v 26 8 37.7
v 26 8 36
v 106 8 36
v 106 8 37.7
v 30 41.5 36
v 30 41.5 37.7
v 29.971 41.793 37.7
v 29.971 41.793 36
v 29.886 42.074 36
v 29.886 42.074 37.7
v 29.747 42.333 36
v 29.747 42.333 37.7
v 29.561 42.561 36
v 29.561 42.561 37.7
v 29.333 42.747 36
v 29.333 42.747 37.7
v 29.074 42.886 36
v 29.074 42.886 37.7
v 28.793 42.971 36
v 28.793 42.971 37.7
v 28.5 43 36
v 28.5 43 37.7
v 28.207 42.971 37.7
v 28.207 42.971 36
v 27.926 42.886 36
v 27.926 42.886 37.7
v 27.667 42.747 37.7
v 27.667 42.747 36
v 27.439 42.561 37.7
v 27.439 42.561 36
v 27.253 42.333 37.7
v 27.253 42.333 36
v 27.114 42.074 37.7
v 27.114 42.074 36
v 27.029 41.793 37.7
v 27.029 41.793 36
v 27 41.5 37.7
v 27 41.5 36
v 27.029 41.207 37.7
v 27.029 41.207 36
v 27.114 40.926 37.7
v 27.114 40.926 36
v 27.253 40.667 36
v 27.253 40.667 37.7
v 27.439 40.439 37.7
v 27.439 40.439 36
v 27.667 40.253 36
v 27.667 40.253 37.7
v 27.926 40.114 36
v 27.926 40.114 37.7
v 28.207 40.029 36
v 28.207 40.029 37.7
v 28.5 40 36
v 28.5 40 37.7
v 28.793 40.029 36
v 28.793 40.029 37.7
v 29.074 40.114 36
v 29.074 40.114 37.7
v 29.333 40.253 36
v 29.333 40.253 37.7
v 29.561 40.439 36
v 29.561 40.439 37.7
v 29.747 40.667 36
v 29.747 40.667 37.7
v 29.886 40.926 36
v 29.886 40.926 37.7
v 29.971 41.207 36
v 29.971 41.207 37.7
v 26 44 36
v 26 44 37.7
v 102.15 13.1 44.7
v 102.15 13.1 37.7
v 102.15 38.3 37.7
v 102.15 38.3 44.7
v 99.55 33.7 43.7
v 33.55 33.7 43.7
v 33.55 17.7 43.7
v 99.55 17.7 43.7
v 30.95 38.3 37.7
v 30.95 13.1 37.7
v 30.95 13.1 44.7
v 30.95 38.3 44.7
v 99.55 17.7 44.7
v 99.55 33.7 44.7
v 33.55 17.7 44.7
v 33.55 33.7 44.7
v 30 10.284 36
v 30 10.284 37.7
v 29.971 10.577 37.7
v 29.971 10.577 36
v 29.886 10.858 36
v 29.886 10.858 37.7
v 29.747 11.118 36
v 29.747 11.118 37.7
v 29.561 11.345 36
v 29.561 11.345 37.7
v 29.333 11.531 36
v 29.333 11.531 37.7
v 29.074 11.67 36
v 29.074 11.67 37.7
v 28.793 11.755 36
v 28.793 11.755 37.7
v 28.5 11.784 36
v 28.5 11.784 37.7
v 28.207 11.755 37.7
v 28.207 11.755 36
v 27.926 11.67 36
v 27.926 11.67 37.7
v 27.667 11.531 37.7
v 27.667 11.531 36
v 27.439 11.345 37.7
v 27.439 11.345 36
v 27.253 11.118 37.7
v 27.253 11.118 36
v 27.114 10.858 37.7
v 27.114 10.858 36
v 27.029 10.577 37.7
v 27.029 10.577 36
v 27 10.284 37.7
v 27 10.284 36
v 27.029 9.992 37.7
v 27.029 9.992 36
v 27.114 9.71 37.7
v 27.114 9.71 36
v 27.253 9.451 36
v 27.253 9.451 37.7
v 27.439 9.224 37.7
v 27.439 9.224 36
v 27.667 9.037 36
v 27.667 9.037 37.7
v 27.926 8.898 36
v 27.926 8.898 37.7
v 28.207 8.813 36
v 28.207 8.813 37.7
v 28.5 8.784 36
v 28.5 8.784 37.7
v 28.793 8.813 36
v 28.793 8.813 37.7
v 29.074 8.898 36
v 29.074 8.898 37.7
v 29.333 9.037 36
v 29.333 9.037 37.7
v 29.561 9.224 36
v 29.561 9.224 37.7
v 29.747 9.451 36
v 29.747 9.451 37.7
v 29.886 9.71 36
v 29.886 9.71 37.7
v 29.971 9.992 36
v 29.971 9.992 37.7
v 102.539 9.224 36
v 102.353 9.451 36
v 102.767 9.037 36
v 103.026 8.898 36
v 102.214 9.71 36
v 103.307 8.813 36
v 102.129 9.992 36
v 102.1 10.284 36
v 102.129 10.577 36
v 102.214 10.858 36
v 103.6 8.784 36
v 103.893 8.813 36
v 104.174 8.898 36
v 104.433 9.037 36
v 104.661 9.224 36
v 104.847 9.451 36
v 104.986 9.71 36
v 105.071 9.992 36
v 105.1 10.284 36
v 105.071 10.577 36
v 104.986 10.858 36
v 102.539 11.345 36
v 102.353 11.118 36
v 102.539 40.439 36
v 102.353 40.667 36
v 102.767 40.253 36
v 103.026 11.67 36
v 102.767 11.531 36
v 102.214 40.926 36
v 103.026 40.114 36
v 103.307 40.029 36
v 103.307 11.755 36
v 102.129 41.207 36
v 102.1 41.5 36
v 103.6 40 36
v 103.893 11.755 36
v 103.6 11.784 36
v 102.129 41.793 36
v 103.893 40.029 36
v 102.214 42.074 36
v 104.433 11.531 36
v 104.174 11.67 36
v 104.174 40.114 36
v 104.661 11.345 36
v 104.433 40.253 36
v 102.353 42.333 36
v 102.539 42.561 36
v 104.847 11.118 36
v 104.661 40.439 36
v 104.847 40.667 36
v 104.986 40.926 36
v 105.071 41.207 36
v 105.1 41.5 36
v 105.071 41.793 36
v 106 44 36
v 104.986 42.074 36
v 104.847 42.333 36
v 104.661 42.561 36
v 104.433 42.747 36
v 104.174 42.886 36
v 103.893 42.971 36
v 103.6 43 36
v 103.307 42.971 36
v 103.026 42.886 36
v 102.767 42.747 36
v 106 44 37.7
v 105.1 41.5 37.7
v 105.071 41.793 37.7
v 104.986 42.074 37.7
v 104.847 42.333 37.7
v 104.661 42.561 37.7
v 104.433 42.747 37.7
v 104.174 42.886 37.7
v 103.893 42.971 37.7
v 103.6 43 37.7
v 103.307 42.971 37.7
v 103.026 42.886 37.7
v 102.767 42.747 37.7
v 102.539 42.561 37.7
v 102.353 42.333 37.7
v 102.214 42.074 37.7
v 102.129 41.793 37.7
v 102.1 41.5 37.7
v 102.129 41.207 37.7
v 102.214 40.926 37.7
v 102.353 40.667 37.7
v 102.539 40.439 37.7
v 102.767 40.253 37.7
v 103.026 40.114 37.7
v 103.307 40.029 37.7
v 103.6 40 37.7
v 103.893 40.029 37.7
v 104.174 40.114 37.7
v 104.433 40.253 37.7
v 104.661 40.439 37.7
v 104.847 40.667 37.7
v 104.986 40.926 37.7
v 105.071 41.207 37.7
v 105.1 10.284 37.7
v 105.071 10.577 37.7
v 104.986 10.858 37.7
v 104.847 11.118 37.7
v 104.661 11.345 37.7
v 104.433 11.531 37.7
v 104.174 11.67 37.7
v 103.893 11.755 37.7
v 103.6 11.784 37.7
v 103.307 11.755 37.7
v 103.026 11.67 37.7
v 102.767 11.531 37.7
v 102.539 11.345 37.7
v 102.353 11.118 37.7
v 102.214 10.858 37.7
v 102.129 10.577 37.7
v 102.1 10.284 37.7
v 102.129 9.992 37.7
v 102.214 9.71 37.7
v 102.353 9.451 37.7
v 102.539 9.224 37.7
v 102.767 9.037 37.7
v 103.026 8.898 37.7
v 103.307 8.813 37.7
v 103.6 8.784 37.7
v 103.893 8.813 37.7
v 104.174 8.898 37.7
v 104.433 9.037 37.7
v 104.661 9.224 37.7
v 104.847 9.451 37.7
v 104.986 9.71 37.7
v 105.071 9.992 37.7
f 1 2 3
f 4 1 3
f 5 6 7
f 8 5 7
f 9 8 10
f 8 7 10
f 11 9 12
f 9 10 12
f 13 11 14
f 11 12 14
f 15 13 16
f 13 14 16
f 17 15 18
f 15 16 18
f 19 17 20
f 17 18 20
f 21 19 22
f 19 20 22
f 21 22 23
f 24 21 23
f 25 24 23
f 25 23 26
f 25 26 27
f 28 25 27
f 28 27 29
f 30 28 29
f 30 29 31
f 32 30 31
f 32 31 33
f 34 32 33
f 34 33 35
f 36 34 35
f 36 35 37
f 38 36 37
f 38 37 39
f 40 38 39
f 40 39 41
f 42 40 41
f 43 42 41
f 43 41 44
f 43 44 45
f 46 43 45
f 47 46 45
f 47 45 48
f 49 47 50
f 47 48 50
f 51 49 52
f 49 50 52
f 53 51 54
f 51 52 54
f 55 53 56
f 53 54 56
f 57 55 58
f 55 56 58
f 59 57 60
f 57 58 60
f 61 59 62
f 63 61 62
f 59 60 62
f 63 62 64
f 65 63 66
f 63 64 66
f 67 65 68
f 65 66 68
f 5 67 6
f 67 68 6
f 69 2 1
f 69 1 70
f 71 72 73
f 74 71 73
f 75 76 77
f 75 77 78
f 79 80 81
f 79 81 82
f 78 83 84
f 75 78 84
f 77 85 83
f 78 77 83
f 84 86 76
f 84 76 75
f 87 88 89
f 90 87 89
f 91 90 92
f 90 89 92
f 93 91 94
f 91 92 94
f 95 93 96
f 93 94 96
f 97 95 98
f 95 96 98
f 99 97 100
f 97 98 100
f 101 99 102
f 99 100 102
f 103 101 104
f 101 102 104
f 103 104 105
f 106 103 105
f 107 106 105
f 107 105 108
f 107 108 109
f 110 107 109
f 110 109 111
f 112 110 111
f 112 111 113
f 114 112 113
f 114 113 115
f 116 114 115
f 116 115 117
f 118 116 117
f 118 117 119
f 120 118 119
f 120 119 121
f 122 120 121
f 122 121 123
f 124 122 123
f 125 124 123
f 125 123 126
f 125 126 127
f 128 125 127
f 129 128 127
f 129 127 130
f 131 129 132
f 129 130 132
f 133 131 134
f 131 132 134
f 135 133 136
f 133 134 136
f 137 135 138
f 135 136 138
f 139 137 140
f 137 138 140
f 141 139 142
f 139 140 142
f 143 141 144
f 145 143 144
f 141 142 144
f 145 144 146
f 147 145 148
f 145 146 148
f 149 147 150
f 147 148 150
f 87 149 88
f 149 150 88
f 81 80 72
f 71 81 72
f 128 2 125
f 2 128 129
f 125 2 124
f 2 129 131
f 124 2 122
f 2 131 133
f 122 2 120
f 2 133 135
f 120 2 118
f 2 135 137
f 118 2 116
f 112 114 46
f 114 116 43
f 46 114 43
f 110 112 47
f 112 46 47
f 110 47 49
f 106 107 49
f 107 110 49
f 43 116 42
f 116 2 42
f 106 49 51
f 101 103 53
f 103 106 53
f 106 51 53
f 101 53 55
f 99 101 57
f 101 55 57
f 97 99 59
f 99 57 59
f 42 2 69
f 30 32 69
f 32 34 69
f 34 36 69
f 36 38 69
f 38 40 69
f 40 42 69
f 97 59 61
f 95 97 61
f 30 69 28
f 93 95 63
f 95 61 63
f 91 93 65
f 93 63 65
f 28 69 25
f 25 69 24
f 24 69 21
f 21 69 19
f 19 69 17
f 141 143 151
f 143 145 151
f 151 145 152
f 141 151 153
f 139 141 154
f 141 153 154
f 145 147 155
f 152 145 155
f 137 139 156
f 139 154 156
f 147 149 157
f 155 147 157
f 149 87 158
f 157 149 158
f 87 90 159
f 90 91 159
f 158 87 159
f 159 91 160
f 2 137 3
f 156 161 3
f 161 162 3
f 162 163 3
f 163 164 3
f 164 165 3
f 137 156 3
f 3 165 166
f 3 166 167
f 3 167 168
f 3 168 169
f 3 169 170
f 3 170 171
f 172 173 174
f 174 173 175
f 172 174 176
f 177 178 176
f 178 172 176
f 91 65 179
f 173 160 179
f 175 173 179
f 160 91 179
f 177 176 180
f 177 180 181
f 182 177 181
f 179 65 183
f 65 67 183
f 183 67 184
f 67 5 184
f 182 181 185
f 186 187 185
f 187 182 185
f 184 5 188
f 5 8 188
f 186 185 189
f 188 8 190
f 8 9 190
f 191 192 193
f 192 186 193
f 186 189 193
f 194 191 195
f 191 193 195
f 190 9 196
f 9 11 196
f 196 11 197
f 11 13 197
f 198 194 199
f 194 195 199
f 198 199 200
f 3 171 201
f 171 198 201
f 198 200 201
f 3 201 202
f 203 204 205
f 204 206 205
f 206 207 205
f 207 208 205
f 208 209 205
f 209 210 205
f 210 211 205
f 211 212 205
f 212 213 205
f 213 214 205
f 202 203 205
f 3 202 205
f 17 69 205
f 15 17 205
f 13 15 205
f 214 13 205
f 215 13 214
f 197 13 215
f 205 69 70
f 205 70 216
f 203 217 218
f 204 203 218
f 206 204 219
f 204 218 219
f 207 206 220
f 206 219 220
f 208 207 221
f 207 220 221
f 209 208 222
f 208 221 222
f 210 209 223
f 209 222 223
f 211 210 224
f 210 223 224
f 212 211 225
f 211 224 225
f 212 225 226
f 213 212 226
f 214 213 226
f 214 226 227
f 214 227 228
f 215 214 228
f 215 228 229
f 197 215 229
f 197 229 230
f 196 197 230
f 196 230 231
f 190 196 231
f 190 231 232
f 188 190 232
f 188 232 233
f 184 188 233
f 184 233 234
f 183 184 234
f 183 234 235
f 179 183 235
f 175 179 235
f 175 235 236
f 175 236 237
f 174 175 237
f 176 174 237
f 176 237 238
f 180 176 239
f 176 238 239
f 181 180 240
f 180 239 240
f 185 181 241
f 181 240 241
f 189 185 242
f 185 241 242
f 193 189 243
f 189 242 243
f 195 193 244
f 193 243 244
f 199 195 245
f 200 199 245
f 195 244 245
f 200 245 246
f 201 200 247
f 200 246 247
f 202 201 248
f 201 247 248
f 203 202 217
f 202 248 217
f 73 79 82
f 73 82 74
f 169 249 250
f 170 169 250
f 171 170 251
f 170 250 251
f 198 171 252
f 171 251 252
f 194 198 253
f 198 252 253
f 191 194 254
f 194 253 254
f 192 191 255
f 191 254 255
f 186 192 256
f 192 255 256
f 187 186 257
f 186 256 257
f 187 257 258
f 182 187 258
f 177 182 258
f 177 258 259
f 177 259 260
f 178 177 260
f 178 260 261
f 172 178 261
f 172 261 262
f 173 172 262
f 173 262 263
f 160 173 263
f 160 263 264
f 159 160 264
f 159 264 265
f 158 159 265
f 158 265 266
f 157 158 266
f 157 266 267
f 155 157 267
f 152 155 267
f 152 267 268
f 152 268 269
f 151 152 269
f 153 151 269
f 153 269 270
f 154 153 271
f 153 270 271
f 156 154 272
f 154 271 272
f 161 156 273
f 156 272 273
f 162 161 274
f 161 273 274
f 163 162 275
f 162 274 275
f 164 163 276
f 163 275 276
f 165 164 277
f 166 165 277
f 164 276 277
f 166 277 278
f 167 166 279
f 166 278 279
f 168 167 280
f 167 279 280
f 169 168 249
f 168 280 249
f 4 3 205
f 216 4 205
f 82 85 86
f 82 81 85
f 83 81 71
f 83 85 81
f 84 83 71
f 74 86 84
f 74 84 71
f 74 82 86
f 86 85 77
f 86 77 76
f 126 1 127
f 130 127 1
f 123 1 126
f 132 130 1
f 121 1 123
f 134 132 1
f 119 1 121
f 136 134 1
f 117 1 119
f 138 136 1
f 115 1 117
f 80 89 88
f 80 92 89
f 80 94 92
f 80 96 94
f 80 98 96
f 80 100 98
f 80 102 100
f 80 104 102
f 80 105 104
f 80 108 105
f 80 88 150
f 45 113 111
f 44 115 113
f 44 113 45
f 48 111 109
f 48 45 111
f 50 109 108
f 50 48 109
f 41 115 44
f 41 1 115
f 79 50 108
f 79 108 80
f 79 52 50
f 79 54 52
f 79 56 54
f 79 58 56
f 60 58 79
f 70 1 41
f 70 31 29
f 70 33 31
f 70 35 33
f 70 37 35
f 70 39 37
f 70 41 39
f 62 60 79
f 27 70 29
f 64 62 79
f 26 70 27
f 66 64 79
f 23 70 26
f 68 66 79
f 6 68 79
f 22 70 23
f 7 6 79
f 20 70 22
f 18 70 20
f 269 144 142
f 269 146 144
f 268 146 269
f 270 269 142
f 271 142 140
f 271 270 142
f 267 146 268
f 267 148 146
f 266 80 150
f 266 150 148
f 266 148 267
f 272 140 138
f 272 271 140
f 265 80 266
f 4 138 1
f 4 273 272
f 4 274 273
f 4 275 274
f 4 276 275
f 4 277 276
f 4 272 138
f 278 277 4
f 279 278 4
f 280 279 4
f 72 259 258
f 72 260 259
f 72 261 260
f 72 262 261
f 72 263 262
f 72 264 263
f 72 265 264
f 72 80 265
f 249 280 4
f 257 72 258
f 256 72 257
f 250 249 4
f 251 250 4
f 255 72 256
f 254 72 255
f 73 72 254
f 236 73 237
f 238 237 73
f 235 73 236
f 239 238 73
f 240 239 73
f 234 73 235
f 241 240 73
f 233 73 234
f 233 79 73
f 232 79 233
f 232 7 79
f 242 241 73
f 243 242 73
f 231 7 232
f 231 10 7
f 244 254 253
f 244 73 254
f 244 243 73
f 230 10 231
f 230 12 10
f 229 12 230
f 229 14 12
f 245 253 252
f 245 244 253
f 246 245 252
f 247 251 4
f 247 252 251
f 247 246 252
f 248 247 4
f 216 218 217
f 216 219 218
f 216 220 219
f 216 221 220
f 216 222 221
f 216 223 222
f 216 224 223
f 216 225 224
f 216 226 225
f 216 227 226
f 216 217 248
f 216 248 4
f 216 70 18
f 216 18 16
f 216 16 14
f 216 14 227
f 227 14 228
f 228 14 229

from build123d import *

# Parameters (mm, degrees)
SKETCH031_W     = 80
SKETCH031_H     = 36
PAD009_DEPTH    = 1.7
SKETCH032_W     = 71.2
SKETCH032_H     = 25.2
PAD010_DEPTH    = 7
SKETCH033_R     = 1.5
POCKET008_DEPTH = 1.701
SKETCH034_W     = 66
SKETCH034_H     = 16
POCKET009_DEPTH = 1


with BuildPart() as part:
    # Sketch031 → Pad009 (new body)
    with BuildSketch(Plane.XY):
        with Locations((40, 18)):
            Rectangle(SKETCH031_W, SKETCH031_H)
    extrude(amount=PAD009_DEPTH)

    # Sketch032 (on Face6 of Pad009) → Pad010 (join)
    with BuildSketch(Plane.XY.offset(1.7)):
        with Locations((40.55, 17.7)):
            Rectangle(SKETCH032_W, SKETCH032_H)
    extrude(amount=PAD010_DEPTH)

    # Sketch033 (on Face5 of Pad010) → Pocket008 (cut, through all)
    with BuildSketch(Plane.XY.offset(1.7)):
        with Locations((2.5, 33.5)):
            Circle(SKETCH033_R)
        with Locations((2.5, 2.28424)):
            Circle(SKETCH033_R)
        with Locations((77.6, 33.5)):
            Circle(SKETCH033_R)
        with Locations((77.6, 2.28424)):
            Circle(SKETCH033_R)
    extrude(amount=-POCKET008_DEPTH, mode=Mode.SUBTRACT)

    # Sketch034 (on Face15 of Pocket008) → Pocket009 (cut)
    with BuildSketch(Plane.XY.offset(8.7)):
        with Locations((40.55, 17.7)):
            Rectangle(SKETCH034_W, SKETCH034_H)
    extrude(amount=-POCKET009_DEPTH, mode=Mode.SUBTRACT)


with BuildPart() as part_1:
    # Body009 placement: moved
    add(part.part.moved(Location((26, 8, 36))))


solid = part_1.part
